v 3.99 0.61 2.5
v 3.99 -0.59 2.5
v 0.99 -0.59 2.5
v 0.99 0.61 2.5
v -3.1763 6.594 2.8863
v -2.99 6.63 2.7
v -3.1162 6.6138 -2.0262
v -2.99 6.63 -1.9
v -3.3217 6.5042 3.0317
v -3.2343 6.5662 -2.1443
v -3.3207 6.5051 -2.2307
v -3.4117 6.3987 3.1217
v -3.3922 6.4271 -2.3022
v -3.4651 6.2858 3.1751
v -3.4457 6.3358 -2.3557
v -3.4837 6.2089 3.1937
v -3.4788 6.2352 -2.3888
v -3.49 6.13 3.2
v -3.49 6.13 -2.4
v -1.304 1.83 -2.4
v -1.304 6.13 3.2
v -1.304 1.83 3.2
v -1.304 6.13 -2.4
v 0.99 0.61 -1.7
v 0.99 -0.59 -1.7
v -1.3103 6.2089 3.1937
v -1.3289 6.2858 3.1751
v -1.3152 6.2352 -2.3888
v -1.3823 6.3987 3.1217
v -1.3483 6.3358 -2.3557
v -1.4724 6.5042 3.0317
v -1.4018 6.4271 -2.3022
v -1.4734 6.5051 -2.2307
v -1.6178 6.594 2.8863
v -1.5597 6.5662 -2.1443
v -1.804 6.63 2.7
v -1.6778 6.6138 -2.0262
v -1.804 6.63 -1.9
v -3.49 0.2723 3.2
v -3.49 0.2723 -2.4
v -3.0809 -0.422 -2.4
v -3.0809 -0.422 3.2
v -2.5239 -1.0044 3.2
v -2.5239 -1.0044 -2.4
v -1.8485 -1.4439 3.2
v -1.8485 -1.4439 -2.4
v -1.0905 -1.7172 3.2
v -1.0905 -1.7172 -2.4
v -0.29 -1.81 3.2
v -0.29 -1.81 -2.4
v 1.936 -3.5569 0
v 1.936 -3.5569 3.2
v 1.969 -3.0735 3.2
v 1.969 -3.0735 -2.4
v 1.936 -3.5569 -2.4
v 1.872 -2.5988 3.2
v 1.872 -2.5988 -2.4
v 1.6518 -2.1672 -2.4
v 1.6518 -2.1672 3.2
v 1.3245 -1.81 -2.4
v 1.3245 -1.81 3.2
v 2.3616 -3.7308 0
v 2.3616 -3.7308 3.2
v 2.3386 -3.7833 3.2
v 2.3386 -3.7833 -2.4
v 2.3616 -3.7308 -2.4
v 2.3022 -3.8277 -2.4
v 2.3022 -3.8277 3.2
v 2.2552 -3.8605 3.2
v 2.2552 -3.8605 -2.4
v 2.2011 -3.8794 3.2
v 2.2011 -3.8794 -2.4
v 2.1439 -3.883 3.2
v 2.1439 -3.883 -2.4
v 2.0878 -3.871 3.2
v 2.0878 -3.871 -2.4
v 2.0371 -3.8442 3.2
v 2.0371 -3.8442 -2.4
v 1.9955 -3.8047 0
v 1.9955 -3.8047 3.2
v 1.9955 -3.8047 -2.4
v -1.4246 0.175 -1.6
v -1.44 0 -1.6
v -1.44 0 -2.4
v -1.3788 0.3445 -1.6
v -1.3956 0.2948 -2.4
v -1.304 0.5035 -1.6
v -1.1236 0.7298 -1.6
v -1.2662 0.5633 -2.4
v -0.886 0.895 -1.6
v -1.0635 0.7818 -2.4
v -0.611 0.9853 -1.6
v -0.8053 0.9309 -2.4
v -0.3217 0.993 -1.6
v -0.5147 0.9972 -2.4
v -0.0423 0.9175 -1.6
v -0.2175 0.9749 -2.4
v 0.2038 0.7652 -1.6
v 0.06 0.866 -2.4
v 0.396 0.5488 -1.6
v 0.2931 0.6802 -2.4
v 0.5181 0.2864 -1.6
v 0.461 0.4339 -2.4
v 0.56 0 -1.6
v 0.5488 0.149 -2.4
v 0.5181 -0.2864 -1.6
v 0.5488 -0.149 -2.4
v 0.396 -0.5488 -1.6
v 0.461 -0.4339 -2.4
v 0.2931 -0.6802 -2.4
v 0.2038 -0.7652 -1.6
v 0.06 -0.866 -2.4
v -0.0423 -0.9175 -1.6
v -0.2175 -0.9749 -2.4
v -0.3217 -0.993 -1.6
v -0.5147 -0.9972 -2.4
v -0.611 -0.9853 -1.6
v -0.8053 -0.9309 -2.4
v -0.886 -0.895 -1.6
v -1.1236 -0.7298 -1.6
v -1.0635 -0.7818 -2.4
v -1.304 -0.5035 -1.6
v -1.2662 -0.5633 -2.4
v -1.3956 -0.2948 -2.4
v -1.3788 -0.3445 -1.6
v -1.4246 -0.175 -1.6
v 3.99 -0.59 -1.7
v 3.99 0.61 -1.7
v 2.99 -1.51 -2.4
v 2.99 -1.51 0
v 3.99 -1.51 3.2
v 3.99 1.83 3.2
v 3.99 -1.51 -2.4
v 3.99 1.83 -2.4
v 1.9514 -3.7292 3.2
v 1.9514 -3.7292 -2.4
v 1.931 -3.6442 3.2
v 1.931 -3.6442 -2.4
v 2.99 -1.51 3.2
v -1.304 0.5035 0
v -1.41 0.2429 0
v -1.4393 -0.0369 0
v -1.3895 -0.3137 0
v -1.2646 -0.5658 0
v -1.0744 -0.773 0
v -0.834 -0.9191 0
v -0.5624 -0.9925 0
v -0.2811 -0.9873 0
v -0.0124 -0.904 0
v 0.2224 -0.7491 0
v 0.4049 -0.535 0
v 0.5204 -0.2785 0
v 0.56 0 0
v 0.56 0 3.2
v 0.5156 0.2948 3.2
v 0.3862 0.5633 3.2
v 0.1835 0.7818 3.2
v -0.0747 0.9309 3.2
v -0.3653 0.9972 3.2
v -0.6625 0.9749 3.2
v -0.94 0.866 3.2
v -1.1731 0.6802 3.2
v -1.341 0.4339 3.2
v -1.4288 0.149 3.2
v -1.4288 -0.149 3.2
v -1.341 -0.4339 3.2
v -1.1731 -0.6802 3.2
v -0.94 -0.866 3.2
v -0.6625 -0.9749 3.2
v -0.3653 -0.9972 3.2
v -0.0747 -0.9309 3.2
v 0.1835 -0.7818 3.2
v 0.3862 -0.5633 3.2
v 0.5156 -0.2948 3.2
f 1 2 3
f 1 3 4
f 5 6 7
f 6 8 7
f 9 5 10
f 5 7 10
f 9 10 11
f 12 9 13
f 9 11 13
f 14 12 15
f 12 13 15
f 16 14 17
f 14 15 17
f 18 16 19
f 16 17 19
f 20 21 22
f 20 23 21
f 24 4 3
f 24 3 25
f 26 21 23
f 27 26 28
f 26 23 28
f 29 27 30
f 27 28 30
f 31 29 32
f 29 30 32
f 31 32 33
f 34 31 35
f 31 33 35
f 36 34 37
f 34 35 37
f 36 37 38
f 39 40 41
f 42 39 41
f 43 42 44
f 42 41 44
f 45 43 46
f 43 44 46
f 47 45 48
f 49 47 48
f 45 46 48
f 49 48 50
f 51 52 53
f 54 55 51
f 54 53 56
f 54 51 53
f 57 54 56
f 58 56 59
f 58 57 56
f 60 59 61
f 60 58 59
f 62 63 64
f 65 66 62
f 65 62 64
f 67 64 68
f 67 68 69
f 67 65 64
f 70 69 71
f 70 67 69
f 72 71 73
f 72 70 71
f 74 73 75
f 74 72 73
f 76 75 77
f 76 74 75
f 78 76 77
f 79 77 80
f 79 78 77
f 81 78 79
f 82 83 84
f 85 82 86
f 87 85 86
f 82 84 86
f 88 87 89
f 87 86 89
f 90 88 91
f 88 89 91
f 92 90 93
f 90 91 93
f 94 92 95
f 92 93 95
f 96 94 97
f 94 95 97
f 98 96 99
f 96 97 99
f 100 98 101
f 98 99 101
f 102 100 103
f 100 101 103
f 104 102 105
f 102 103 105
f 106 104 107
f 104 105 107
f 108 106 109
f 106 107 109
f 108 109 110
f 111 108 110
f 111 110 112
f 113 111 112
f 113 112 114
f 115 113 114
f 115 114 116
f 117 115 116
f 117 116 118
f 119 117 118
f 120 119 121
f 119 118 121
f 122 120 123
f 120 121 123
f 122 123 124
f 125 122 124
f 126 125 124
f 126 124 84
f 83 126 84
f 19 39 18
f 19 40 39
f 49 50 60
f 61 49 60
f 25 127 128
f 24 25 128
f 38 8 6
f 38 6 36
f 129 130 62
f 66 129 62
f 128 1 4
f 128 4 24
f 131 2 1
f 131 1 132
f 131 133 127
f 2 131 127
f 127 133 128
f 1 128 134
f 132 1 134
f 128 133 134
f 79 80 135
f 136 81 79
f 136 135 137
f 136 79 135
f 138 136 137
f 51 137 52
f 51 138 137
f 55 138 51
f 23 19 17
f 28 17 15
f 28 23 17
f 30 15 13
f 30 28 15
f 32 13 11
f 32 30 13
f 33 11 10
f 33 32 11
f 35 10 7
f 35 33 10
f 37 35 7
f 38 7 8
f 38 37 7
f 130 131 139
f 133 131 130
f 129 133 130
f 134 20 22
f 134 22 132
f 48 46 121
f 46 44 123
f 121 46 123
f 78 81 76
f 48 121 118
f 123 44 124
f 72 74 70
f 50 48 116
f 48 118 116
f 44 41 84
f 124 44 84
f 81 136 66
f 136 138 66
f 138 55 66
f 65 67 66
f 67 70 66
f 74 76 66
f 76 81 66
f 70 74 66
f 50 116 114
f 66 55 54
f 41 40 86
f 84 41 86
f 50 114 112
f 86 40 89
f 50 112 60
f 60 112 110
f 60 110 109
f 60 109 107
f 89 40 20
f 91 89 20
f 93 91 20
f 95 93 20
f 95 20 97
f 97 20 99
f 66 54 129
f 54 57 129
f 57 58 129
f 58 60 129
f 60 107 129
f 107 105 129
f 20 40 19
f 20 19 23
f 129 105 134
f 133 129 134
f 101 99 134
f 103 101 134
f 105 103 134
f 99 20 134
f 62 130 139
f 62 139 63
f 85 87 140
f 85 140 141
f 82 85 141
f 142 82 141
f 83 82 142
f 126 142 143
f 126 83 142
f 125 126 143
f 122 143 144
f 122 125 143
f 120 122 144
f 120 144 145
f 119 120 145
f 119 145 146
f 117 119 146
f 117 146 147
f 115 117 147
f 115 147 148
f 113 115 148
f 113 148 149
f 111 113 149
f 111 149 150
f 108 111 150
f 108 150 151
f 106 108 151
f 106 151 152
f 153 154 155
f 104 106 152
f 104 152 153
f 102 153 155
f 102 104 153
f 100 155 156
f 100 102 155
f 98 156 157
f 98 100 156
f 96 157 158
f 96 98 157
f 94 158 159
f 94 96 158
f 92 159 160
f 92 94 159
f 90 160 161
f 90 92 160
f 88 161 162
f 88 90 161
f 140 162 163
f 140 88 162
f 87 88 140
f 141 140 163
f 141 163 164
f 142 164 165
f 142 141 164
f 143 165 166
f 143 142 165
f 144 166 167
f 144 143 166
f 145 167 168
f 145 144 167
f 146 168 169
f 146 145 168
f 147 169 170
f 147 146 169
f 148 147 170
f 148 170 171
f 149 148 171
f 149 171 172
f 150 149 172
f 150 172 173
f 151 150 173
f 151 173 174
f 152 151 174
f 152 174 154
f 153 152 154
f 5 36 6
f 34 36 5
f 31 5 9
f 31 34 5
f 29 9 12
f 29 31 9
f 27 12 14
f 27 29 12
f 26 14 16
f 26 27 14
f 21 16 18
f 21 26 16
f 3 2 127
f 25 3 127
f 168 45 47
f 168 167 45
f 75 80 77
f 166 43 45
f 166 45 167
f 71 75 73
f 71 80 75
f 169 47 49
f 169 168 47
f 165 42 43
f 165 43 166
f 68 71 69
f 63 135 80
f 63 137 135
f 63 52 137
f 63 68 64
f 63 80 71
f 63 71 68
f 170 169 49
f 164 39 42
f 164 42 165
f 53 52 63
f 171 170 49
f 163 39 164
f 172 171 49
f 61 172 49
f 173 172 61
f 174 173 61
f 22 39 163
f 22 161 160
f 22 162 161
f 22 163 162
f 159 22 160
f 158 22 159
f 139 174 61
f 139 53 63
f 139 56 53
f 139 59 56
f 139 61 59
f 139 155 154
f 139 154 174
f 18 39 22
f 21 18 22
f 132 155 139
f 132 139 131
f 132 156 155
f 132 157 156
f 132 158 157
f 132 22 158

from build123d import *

# Parameters (mm, degrees)
CROQUIS1_W               = 5.98
CROQUIS1_H               = 2.26
CROQUIS1_R               = 1
SALIENTE_EXTRUIR1_DEPTH  = 3.2
CROQUIS2_W               = 2.18
CROQUIS2_H               = 0.38
SALIENTE_EXTRUIR2_DEPTH  = 3.2
CROQUIS4_W               = 1.68598805
CROQUIS4_H               = 3.2
SALIENTE_EXTRUIR3_DEPTH  = 5.5
SALIENTE_EXTRUIR4_DEPTH  = 3.2
REDONDEO2_R              = 0.3
REDONDEO3_R              = 0.21
CROQUIS6_W               = 3.2
CROQUIS6_H               = 7.76
SALIENTE_EXTRUIR5_DEPTH  = 0.5
CROQUIS7_W               = 2.18598805
CROQUIS7_H               = 7.76
SALIENTE_EXTRUIR6_DEPTH  = 1.6
SALIENTE_EXTRUIR7_START  = 1.6
SALIENTE_EXTRUIR7_DEPTH  = 1.6
CORTAR_EXTRUIR2_START    = -10
CORTAR_EXTRUIR2_DEPTH    = 10
CROQUIS11_W              = 4.8
CROQUIS11_H              = 2.64
SALIENTE_EXTRUIR8_DEPTH  = 1
CROQUIS15_W              = 4.3
CROQUIS15_H              = 4.8
SALIENTE_EXTRUIR10_DEPTH = 0.38
REDONDEO6_R              = 3.2
CROQUIS16_W              = 5.29401195
CROQUIS16_H              = 4.8
SALIENTE_EXTRUIR11_DEPTH = 0.4
SALIENTE_EXTRUIR12_START = 0.8
CROQUIS18_R              = 1
SALIENTE_EXTRUIR12_DEPTH = 0.8
REDONDEO7_R              = 0.5
CROQUIS19_W              = 4.2
CROQUIS19_H              = 1.2
CORTAR_EXTRUIR3_DEPTH    = 3
SALIENTE_EXTRUIR13_START = -5.6
CROQUIS20_W              = 5.29401195
CROQUIS20_H              = 0.3
SALIENTE_EXTRUIR13_DEPTH = 5.6


with BuildPart() as part:
    # Croquis1 → Saliente-Extruir1 (new body)
    with BuildSketch(Plane.XY):
        Rectangle(CROQUIS1_W, CROQUIS1_H)
        with Locations((-0.44, 0)):
            Circle(CROQUIS1_R, mode=Mode.SUBTRACT)
    extrude(amount=SALIENTE_EXTRUIR1_DEPTH)

    # Croquis2 → Saliente-Extruir2 (add)
    with BuildSketch(Plane.XY):
        with Locations((1.9, -1.32)):
            Rectangle(CROQUIS2_W, CROQUIS2_H)
    extrude(amount=SALIENTE_EXTRUIR2_DEPTH)

    # Croquis4 → Saliente-Extruir3 (add)
    with BuildSketch(Plane(origin=(0, 1.13, 0), x_dir=(1, 0, 0), z_dir=(0, 1, 0))):
        with Locations((-2.147005975, -1.6)):
            Rectangle(CROQUIS4_W, CROQUIS4_H)
    extrude(amount=SALIENTE_EXTRUIR3_DEPTH)

    # Croquis5 → Saliente-Extruir4 (add)
    with BuildSketch(Plane(origin=(0, 0, 0), x_dir=(-1, 0, 0), z_dir=(0, 0, -1))):
        with BuildLine():
            Line((-2.99, -1.51), (-2.312022185, -3.905922804))
            ThreePointArc((-2.312022185, -3.905922804), (-2.072768276, -3.925139809), (-1.86757295, -3.80061429))
            ThreePointArc((-1.86757295, -3.80061429), (-1.807264861, -2.439011425), (-0.81, -1.51))
            Line((-0.81, -1.51), (-2.99, -1.51))
        make_face()
    extrude(amount=-SALIENTE_EXTRUIR4_DEPTH)

    # Redondeo2
    # the kernel refuses this fillet: 0.3 mm, written as the material it takes off along each edge
    with BuildSketch(Plane(origin=(1.86757295, -3.80061429, -1.141887159), x_dir=(0.2702256968555762, 0.9627970049594662, 0), z_dir=(0, 0, 1))) as redondeo2_piece_1:
        with BuildLine():
            CenterArc((0.274279078, -0.299257177), REDONDEO2_R, 94.032824869, 117.548904109)
            Line((0.018710883, -0.456371459), (0.013599519, -0.459513744))
            ThreePointArc((0.013599519, -0.459513744), (-0.07043871, -0.231457229), (-0.005003521, 0.00331131))
            Line((-0.005003521, 0.00331131), (0.000421968, 0.005985144))
            ThreePointArc((0.000421968, 0.005985144), (0.126590344, 0.001543061), (0.25275872, 0.005985144))
            Line((0.25275872, 0.005985144), (0.253180688, 0))
        make_face()
    extrude(amount=5.483774318, mode=Mode.SUBTRACT)

    # Redondeo3
    redondeo3_edges = [part.edges().sort_by_distance(p)[0] for p in [
        (2.312022185, -3.905922804, 1.6),
    ]]
    fillet(redondeo3_edges, radius=REDONDEO3_R)

    # Croquis6 → Saliente-Extruir5 (add)
    with BuildSketch(Plane.ZY.offset(2.99)):
        with Locations((1.6, 2.75)):
            Rectangle(CROQUIS6_W, CROQUIS6_H)
    extrude(amount=SALIENTE_EXTRUIR5_DEPTH)

    # Croquis7 → Saliente-Extruir6 (add)
    with BuildSketch(Plane(origin=(0, 0, 0), x_dir=(-1, 0, 0), z_dir=(0, 0, -1))):
        with Locations((2.397005975, 2.75)):
            Rectangle(CROQUIS7_W, CROQUIS7_H)
    extrude(amount=SALIENTE_EXTRUIR6_DEPTH)

    # Croquis8 → Saliente-Extruir7 (add)
    with BuildSketch(Plane(origin=(0, 0, 0), x_dir=(-1, 0, 0), z_dir=(0, 0, -1)).offset(SALIENTE_EXTRUIR7_START)):
        with BuildLine():
            Line((-0.81, -1.13), (1.30401195, -1.13))
            Line((1.30401195, -1.13), (1.30401195, -0.503471301))
            ThreePointArc((1.30401195, -0.503471301), (-0.56, 0), (1.30401195, 0.503471301))
            Line((1.30401195, 0.503471301), (1.30401195, 1.13))
            Line((1.30401195, 1.13), (-2.99, 1.13))
            Line((-2.99, 1.13), (-2.99, -1.51))
            Line((-2.99, -1.51), (-2.361581826, -3.730782744))
            ThreePointArc((-2.361581826, -3.730782744), (-2.201095129, -3.879446502), (-1.995487215, -3.804731853))
            ThreePointArc((-1.995487215, -3.804731853), (-1.938099887, -3.687426244), (-1.935988878, -3.556852683))
            ThreePointArc((-1.935988878, -3.556852683), (-1.750154515, -2.325947779), (-0.81, -1.51))
            Line((-0.81, -1.51), (-0.81, -1.13))
        make_face()
    extrude(amount=-SALIENTE_EXTRUIR7_DEPTH)

    # Croquis9 → Cortar-Extruir2 (cut)
    with BuildSketch(Plane.XY.offset(CORTAR_EXTRUIR2_START)):
        with BuildLine():
            Line((-1.30401195, -0.503471301), (-1.30401195, 0.503471301))
            ThreePointArc((-1.30401195, 0.503471301), (-1.44, 0), (-1.30401195, -0.503471301))
        make_face()
    extrude(amount=CORTAR_EXTRUIR2_DEPTH, mode=Mode.SUBTRACT)

    # Croquis11 → Saliente-Extruir8 (add)
    with BuildSketch(Plane(origin=(2.99, 0, 0), x_dir=(0, 0, -1), z_dir=(1, 0, 0))):
        with Locations((-0.8, -0.19)):
            Rectangle(CROQUIS11_W, CROQUIS11_H)
    extrude(amount=SALIENTE_EXTRUIR8_DEPTH)

    # Croquis15 → Saliente-Extruir10 (add)
    with BuildSketch(Plane.XZ.offset(1.13)):
        with Locations((-1.34, 0.8)):
            Rectangle(CROQUIS15_W, CROQUIS15_H)
    extrude(amount=SALIENTE_EXTRUIR10_DEPTH)

    # Redondeo6
    redondeo6_edges = [part.edges().sort_by_distance(p)[0] for p in [
        (-3.49, -1.51, 0.8),
    ]]
    fillet(redondeo6_edges, radius=REDONDEO6_R)

    # Croquis16 → Saliente-Extruir11 (add)
    with BuildSketch(Plane(origin=(0, 1.13, 0), x_dir=(1, 0, 0), z_dir=(0, 1, 0))):
        with Locations((1.342994025, -0.8)):
            Rectangle(CROQUIS16_W, CROQUIS16_H)
    extrude(amount=SALIENTE_EXTRUIR11_DEPTH)

    # Croquis18 → Saliente-Extruir12 (add)
    with BuildSketch(Plane(origin=(0, 0, -1.6), x_dir=(-1, 0, 0), z_dir=(0, 0, -1)).offset(SALIENTE_EXTRUIR12_START)):
        with BuildLine():
            Line((-0.81, -1.51), (0.29, -1.51))
            ThreePointArc((0.29, -1.51), (2.5527417, -0.5727417), (3.49, 1.69))
            Line((3.49, 1.69), (3.49, 6.63))
            Line((3.49, 6.63), (1.30401195, 6.63))
            Line((1.30401195, 6.63), (1.30401195, 1.53))
            Line((1.30401195, 1.53), (-3.99, 1.53))
            Line((-3.99, 1.53), (-3.99, -1.51))
            Line((-3.99, -1.51), (-2.99, -1.51))
            Line((-2.99, -1.51), (-2.361581826, -3.730782744))
            ThreePointArc((-2.361581826, -3.730782744), (-2.201095129, -3.879446502), (-1.995487215, -3.804731853))
            ThreePointArc((-1.995487215, -3.804731853), (-1.938099887, -3.687426244), (-1.935988878, -3.556852683))
            ThreePointArc((-1.935988878, -3.556852683), (-1.750154515, -2.325947779), (-0.81, -1.51))
        make_face()
        with Locations((0.44, 0)):
            Circle(CROQUIS18_R, mode=Mode.SUBTRACT)
    extrude(amount=-SALIENTE_EXTRUIR12_DEPTH)

    # Redondeo7
    redondeo7_edges = [part.edges().sort_by_distance(p)[0] for p in [
        (-2.397005975, 6.63, -2.4),
        (-2.397005975, 6.63, 3.2),
        (-1.30401195, 6.63, 0.4),
        (-3.49, 6.63, 0.4),
    ]]
    fillet(redondeo7_edges, radius=REDONDEO7_R)

    # Croquis19 → Cortar-Extruir3 (cut)
    with BuildSketch(Plane(origin=(3.99, 0, 0), x_dir=(0, 0, -1), z_dir=(1, 0, 0))):
        with Locations((-0.4, 0.01)):
            Rectangle(CROQUIS19_W, CROQUIS19_H)
    extrude(amount=-CORTAR_EXTRUIR3_DEPTH, mode=Mode.SUBTRACT)

    # Croquis20 → Saliente-Extruir13 (add)
    with BuildSketch(Plane.XY.offset(3.2).offset(SALIENTE_EXTRUIR13_START)):
        with Locations((1.342994025, 1.68)):
            Rectangle(CROQUIS20_W, CROQUIS20_H)
        with BuildLine():
            Line((-3.49, 1.69), (-3.49, 0.272255312))
            ThreePointArc((-3.49, 0.272255312), (-2.198912464, -1.243607541), (-0.29, -1.81))
            Line((-0.29, -1.81), (1.324488812, -1.81))
            ThreePointArc((1.324488812, -1.81), (1.079738106, -1.63857377), (0.81, -1.51))
            Line((0.81, -1.51), (-0.29, -1.51))
            ThreePointArc((-0.29, -1.51), (-2.5527417, -0.5727417), (-3.49, 1.69))
        make_face()
    extrude(amount=SALIENTE_EXTRUIR13_DEPTH)


solid = part.part
